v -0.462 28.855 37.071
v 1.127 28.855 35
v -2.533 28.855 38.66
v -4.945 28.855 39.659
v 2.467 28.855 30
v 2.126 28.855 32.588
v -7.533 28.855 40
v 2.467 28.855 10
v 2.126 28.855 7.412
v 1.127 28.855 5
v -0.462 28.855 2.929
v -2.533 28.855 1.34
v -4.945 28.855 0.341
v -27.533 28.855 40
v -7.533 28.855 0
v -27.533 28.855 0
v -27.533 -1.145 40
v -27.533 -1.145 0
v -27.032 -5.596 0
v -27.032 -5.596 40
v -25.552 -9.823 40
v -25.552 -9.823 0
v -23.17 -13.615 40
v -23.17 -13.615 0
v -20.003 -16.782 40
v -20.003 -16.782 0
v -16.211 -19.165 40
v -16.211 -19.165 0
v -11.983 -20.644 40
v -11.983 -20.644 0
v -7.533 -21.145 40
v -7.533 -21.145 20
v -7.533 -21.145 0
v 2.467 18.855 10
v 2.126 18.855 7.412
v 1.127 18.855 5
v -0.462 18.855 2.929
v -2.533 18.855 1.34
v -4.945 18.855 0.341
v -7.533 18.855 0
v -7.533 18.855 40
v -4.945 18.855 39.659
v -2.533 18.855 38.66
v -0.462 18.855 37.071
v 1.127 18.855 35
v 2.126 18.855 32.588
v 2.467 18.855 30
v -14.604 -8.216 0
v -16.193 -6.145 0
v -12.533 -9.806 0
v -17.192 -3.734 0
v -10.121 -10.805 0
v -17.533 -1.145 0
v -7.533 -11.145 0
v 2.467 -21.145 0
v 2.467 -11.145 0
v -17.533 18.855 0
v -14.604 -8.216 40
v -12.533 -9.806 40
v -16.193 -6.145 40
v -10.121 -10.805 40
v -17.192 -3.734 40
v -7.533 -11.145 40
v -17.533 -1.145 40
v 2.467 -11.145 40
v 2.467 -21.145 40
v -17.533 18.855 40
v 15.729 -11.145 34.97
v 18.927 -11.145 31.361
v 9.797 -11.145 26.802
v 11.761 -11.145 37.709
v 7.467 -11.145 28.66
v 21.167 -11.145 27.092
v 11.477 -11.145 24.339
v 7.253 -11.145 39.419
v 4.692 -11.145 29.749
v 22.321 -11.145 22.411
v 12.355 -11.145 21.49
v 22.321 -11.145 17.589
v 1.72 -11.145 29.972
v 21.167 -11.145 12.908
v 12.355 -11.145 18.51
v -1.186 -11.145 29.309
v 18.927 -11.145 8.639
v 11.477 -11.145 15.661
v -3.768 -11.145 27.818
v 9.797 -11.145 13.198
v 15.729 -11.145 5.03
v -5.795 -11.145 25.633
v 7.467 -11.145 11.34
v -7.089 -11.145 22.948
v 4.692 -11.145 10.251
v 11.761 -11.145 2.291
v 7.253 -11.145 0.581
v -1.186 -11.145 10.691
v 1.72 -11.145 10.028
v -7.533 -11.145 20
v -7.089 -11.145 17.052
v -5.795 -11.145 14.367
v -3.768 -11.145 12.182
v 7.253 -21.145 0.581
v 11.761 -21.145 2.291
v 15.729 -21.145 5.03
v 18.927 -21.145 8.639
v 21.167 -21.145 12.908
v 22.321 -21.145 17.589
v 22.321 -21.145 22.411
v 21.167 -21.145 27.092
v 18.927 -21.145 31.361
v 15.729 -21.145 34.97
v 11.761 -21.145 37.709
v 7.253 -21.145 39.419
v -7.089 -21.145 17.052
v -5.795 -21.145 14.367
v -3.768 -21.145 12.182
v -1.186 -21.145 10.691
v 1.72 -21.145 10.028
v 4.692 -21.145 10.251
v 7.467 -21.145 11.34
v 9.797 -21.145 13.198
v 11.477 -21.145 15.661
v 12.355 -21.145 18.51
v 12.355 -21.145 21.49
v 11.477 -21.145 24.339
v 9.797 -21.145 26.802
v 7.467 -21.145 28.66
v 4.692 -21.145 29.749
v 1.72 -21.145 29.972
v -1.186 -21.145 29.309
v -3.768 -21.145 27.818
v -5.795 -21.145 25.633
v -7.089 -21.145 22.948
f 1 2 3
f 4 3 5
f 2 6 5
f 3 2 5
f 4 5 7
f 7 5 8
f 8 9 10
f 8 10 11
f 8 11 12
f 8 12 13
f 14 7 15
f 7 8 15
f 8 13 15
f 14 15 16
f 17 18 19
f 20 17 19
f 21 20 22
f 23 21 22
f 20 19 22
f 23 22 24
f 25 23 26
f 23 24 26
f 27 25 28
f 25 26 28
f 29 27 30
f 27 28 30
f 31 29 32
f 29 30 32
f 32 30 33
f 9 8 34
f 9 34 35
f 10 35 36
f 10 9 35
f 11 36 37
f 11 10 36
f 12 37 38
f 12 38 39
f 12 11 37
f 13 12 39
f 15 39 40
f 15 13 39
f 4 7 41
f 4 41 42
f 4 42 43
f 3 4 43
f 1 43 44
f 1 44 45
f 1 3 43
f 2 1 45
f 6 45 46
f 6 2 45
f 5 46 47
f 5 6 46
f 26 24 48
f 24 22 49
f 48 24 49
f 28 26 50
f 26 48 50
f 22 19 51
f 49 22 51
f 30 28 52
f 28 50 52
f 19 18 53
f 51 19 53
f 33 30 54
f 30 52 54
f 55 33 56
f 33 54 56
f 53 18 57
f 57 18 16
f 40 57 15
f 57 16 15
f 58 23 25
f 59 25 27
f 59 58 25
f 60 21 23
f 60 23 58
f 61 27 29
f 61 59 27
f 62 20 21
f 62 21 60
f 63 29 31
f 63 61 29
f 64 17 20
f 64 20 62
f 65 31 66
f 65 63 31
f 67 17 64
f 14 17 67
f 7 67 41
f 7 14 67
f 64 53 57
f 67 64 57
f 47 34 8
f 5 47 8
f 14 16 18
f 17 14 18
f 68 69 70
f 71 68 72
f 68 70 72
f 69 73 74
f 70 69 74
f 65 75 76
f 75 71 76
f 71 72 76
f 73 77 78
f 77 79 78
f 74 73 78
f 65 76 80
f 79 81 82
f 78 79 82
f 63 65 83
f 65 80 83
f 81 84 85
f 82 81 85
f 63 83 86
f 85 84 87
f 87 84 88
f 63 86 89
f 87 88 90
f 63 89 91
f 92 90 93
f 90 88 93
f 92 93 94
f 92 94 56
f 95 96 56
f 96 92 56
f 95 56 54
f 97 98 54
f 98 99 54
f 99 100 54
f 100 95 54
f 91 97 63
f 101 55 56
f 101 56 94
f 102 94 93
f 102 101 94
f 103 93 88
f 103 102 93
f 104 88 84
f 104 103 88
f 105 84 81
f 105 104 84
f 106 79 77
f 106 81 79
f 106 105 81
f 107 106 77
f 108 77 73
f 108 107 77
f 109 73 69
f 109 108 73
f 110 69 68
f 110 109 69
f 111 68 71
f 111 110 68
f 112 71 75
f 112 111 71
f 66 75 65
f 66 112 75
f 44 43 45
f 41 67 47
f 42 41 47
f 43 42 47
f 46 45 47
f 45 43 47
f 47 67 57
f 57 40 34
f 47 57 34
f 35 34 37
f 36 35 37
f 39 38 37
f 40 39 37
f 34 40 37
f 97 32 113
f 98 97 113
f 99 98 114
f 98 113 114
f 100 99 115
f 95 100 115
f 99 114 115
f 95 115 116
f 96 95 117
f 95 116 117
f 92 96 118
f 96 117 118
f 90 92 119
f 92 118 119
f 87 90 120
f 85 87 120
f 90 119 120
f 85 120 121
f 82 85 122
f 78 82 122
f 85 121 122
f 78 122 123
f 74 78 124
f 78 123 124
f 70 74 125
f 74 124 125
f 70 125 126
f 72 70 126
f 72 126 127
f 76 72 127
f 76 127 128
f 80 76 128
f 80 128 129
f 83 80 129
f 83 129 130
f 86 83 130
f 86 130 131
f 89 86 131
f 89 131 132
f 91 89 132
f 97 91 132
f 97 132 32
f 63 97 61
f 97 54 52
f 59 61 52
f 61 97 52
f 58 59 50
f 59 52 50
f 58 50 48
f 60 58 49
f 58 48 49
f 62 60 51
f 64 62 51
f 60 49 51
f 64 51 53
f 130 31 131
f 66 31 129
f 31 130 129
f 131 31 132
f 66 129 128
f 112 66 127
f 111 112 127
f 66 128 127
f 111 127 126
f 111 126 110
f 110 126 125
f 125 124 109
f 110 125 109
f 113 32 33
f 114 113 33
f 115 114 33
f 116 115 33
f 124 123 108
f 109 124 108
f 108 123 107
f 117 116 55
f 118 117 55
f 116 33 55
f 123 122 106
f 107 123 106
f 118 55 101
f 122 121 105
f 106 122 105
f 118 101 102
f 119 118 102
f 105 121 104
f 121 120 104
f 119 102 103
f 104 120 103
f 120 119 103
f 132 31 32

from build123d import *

# Parameters (mm, degrees)
BOSS_EXTRUDE1_DEPTH = 40
SKETCH3_OUTSIDE_W   = 68.248
SKETCH3_OUTSIDE_H   = 58.248
CUT_EXTRUDE1_DEPTH  = 40
SKETCH4_OUTSIDE_W   = 68.248
SKETCH4_OUTSIDE_H   = 58.248
SKETCH4_OUTSIDE_R   = 10
CUT_EXTRUDE4_DEPTH  = 40


with BuildPart() as part:
    # Sketch2 → Boss-Extrude1 (new body)
    with BuildSketch(Plane.XY):
        with BuildLine():
            Line((2.466960352, 28.854625551), (-27.533039648, 28.854625551))
            Line((-27.533039648, 28.854625551), (-27.533039648, -1.145374449))
            ThreePointArc((-27.533039648, -1.145374449), (-21.675175271, -15.287510073), (-7.533039648, -21.145374449))
            Line((-7.533039648, -21.145374449), (22.466960352, -21.145374449))
            Line((22.466960352, -21.145374449), (22.466960352, -11.145374449))
            Line((22.466960352, -11.145374449), (-7.533039648, -11.145374449))
            ThreePointArc((-7.533039648, -11.145374449), (-14.604107459, -8.216442261), (-17.533039648, -1.145374449))
            Line((-17.533039648, -1.145374449), (-17.533039648, 18.854625551))
            Line((-17.533039648, 18.854625551), (2.466960352, 18.854625551))
            Line((2.466960352, 18.854625551), (2.466960352, 28.854625551))
        make_face()
    extrude(amount=BOSS_EXTRUDE1_DEPTH)

    # Sketch3 outside → Cut-Extrude1 (cut)
    with BuildSketch(Plane(origin=(0, 28.854625551, 0), x_dir=(1, 0, 0), z_dir=(0, 1, 0))):
        with Locations((-2.533, -20)):
            Rectangle(SKETCH3_OUTSIDE_W, SKETCH3_OUTSIDE_H)
        with BuildLine():
            Line((-27.533039648, 0), (-27.533039648, -40))
            Line((-27.533039648, -40), (-7.533039648, -40))
            ThreePointArc((-7.533039648, -40), (-0.461971836, -37.071067812), (2.466960352, -30))
            Line((2.466960352, -30), (2.466960352, -10))
            ThreePointArc((2.466960352, -10), (-0.461971836, -2.928932188), (-7.533039648, 0))
            Line((-7.533039648, 0), (-27.533039648, 0))
        make_face(mode=Mode.SUBTRACT)
    extrude(amount=-CUT_EXTRUDE1_DEPTH, mode=Mode.SUBTRACT)

    # Sketch4 outside → Cut-Extrude4 (cut)
    # profile 1 of 2: a face of its own
    with BuildSketch(Plane.XZ.offset(21.145374449)):
        with Locations((-2.533, 20)):
            Rectangle(SKETCH4_OUTSIDE_W, SKETCH4_OUTSIDE_H)
        with BuildLine():
            Line((-7.533039648, 40), (-27.533039648, 40))
            Line((-27.533039648, 40), (-27.533039648, 0))
            Line((-27.533039648, 0), (-7.533039648, 0))
            Line((-7.533039648, 0), (2.466960352, 0))
            ThreePointArc((2.466960352, 0), (22.466960352, 20), (2.466960352, 40))
            Line((2.466960352, 40), (-7.533039648, 40))
        make_face(mode=Mode.SUBTRACT)
    # profile 2 of 2: a face of its own
    with BuildSketch(Plane.XZ.offset(21.145374449)):
        with Locations(Location((2.466960352, 20, 0), (0, 0, 180))):
            Circle(SKETCH4_OUTSIDE_R)
    extrude(amount=-CUT_EXTRUDE4_DEPTH, mode=Mode.SUBTRACT)


solid = part.part
